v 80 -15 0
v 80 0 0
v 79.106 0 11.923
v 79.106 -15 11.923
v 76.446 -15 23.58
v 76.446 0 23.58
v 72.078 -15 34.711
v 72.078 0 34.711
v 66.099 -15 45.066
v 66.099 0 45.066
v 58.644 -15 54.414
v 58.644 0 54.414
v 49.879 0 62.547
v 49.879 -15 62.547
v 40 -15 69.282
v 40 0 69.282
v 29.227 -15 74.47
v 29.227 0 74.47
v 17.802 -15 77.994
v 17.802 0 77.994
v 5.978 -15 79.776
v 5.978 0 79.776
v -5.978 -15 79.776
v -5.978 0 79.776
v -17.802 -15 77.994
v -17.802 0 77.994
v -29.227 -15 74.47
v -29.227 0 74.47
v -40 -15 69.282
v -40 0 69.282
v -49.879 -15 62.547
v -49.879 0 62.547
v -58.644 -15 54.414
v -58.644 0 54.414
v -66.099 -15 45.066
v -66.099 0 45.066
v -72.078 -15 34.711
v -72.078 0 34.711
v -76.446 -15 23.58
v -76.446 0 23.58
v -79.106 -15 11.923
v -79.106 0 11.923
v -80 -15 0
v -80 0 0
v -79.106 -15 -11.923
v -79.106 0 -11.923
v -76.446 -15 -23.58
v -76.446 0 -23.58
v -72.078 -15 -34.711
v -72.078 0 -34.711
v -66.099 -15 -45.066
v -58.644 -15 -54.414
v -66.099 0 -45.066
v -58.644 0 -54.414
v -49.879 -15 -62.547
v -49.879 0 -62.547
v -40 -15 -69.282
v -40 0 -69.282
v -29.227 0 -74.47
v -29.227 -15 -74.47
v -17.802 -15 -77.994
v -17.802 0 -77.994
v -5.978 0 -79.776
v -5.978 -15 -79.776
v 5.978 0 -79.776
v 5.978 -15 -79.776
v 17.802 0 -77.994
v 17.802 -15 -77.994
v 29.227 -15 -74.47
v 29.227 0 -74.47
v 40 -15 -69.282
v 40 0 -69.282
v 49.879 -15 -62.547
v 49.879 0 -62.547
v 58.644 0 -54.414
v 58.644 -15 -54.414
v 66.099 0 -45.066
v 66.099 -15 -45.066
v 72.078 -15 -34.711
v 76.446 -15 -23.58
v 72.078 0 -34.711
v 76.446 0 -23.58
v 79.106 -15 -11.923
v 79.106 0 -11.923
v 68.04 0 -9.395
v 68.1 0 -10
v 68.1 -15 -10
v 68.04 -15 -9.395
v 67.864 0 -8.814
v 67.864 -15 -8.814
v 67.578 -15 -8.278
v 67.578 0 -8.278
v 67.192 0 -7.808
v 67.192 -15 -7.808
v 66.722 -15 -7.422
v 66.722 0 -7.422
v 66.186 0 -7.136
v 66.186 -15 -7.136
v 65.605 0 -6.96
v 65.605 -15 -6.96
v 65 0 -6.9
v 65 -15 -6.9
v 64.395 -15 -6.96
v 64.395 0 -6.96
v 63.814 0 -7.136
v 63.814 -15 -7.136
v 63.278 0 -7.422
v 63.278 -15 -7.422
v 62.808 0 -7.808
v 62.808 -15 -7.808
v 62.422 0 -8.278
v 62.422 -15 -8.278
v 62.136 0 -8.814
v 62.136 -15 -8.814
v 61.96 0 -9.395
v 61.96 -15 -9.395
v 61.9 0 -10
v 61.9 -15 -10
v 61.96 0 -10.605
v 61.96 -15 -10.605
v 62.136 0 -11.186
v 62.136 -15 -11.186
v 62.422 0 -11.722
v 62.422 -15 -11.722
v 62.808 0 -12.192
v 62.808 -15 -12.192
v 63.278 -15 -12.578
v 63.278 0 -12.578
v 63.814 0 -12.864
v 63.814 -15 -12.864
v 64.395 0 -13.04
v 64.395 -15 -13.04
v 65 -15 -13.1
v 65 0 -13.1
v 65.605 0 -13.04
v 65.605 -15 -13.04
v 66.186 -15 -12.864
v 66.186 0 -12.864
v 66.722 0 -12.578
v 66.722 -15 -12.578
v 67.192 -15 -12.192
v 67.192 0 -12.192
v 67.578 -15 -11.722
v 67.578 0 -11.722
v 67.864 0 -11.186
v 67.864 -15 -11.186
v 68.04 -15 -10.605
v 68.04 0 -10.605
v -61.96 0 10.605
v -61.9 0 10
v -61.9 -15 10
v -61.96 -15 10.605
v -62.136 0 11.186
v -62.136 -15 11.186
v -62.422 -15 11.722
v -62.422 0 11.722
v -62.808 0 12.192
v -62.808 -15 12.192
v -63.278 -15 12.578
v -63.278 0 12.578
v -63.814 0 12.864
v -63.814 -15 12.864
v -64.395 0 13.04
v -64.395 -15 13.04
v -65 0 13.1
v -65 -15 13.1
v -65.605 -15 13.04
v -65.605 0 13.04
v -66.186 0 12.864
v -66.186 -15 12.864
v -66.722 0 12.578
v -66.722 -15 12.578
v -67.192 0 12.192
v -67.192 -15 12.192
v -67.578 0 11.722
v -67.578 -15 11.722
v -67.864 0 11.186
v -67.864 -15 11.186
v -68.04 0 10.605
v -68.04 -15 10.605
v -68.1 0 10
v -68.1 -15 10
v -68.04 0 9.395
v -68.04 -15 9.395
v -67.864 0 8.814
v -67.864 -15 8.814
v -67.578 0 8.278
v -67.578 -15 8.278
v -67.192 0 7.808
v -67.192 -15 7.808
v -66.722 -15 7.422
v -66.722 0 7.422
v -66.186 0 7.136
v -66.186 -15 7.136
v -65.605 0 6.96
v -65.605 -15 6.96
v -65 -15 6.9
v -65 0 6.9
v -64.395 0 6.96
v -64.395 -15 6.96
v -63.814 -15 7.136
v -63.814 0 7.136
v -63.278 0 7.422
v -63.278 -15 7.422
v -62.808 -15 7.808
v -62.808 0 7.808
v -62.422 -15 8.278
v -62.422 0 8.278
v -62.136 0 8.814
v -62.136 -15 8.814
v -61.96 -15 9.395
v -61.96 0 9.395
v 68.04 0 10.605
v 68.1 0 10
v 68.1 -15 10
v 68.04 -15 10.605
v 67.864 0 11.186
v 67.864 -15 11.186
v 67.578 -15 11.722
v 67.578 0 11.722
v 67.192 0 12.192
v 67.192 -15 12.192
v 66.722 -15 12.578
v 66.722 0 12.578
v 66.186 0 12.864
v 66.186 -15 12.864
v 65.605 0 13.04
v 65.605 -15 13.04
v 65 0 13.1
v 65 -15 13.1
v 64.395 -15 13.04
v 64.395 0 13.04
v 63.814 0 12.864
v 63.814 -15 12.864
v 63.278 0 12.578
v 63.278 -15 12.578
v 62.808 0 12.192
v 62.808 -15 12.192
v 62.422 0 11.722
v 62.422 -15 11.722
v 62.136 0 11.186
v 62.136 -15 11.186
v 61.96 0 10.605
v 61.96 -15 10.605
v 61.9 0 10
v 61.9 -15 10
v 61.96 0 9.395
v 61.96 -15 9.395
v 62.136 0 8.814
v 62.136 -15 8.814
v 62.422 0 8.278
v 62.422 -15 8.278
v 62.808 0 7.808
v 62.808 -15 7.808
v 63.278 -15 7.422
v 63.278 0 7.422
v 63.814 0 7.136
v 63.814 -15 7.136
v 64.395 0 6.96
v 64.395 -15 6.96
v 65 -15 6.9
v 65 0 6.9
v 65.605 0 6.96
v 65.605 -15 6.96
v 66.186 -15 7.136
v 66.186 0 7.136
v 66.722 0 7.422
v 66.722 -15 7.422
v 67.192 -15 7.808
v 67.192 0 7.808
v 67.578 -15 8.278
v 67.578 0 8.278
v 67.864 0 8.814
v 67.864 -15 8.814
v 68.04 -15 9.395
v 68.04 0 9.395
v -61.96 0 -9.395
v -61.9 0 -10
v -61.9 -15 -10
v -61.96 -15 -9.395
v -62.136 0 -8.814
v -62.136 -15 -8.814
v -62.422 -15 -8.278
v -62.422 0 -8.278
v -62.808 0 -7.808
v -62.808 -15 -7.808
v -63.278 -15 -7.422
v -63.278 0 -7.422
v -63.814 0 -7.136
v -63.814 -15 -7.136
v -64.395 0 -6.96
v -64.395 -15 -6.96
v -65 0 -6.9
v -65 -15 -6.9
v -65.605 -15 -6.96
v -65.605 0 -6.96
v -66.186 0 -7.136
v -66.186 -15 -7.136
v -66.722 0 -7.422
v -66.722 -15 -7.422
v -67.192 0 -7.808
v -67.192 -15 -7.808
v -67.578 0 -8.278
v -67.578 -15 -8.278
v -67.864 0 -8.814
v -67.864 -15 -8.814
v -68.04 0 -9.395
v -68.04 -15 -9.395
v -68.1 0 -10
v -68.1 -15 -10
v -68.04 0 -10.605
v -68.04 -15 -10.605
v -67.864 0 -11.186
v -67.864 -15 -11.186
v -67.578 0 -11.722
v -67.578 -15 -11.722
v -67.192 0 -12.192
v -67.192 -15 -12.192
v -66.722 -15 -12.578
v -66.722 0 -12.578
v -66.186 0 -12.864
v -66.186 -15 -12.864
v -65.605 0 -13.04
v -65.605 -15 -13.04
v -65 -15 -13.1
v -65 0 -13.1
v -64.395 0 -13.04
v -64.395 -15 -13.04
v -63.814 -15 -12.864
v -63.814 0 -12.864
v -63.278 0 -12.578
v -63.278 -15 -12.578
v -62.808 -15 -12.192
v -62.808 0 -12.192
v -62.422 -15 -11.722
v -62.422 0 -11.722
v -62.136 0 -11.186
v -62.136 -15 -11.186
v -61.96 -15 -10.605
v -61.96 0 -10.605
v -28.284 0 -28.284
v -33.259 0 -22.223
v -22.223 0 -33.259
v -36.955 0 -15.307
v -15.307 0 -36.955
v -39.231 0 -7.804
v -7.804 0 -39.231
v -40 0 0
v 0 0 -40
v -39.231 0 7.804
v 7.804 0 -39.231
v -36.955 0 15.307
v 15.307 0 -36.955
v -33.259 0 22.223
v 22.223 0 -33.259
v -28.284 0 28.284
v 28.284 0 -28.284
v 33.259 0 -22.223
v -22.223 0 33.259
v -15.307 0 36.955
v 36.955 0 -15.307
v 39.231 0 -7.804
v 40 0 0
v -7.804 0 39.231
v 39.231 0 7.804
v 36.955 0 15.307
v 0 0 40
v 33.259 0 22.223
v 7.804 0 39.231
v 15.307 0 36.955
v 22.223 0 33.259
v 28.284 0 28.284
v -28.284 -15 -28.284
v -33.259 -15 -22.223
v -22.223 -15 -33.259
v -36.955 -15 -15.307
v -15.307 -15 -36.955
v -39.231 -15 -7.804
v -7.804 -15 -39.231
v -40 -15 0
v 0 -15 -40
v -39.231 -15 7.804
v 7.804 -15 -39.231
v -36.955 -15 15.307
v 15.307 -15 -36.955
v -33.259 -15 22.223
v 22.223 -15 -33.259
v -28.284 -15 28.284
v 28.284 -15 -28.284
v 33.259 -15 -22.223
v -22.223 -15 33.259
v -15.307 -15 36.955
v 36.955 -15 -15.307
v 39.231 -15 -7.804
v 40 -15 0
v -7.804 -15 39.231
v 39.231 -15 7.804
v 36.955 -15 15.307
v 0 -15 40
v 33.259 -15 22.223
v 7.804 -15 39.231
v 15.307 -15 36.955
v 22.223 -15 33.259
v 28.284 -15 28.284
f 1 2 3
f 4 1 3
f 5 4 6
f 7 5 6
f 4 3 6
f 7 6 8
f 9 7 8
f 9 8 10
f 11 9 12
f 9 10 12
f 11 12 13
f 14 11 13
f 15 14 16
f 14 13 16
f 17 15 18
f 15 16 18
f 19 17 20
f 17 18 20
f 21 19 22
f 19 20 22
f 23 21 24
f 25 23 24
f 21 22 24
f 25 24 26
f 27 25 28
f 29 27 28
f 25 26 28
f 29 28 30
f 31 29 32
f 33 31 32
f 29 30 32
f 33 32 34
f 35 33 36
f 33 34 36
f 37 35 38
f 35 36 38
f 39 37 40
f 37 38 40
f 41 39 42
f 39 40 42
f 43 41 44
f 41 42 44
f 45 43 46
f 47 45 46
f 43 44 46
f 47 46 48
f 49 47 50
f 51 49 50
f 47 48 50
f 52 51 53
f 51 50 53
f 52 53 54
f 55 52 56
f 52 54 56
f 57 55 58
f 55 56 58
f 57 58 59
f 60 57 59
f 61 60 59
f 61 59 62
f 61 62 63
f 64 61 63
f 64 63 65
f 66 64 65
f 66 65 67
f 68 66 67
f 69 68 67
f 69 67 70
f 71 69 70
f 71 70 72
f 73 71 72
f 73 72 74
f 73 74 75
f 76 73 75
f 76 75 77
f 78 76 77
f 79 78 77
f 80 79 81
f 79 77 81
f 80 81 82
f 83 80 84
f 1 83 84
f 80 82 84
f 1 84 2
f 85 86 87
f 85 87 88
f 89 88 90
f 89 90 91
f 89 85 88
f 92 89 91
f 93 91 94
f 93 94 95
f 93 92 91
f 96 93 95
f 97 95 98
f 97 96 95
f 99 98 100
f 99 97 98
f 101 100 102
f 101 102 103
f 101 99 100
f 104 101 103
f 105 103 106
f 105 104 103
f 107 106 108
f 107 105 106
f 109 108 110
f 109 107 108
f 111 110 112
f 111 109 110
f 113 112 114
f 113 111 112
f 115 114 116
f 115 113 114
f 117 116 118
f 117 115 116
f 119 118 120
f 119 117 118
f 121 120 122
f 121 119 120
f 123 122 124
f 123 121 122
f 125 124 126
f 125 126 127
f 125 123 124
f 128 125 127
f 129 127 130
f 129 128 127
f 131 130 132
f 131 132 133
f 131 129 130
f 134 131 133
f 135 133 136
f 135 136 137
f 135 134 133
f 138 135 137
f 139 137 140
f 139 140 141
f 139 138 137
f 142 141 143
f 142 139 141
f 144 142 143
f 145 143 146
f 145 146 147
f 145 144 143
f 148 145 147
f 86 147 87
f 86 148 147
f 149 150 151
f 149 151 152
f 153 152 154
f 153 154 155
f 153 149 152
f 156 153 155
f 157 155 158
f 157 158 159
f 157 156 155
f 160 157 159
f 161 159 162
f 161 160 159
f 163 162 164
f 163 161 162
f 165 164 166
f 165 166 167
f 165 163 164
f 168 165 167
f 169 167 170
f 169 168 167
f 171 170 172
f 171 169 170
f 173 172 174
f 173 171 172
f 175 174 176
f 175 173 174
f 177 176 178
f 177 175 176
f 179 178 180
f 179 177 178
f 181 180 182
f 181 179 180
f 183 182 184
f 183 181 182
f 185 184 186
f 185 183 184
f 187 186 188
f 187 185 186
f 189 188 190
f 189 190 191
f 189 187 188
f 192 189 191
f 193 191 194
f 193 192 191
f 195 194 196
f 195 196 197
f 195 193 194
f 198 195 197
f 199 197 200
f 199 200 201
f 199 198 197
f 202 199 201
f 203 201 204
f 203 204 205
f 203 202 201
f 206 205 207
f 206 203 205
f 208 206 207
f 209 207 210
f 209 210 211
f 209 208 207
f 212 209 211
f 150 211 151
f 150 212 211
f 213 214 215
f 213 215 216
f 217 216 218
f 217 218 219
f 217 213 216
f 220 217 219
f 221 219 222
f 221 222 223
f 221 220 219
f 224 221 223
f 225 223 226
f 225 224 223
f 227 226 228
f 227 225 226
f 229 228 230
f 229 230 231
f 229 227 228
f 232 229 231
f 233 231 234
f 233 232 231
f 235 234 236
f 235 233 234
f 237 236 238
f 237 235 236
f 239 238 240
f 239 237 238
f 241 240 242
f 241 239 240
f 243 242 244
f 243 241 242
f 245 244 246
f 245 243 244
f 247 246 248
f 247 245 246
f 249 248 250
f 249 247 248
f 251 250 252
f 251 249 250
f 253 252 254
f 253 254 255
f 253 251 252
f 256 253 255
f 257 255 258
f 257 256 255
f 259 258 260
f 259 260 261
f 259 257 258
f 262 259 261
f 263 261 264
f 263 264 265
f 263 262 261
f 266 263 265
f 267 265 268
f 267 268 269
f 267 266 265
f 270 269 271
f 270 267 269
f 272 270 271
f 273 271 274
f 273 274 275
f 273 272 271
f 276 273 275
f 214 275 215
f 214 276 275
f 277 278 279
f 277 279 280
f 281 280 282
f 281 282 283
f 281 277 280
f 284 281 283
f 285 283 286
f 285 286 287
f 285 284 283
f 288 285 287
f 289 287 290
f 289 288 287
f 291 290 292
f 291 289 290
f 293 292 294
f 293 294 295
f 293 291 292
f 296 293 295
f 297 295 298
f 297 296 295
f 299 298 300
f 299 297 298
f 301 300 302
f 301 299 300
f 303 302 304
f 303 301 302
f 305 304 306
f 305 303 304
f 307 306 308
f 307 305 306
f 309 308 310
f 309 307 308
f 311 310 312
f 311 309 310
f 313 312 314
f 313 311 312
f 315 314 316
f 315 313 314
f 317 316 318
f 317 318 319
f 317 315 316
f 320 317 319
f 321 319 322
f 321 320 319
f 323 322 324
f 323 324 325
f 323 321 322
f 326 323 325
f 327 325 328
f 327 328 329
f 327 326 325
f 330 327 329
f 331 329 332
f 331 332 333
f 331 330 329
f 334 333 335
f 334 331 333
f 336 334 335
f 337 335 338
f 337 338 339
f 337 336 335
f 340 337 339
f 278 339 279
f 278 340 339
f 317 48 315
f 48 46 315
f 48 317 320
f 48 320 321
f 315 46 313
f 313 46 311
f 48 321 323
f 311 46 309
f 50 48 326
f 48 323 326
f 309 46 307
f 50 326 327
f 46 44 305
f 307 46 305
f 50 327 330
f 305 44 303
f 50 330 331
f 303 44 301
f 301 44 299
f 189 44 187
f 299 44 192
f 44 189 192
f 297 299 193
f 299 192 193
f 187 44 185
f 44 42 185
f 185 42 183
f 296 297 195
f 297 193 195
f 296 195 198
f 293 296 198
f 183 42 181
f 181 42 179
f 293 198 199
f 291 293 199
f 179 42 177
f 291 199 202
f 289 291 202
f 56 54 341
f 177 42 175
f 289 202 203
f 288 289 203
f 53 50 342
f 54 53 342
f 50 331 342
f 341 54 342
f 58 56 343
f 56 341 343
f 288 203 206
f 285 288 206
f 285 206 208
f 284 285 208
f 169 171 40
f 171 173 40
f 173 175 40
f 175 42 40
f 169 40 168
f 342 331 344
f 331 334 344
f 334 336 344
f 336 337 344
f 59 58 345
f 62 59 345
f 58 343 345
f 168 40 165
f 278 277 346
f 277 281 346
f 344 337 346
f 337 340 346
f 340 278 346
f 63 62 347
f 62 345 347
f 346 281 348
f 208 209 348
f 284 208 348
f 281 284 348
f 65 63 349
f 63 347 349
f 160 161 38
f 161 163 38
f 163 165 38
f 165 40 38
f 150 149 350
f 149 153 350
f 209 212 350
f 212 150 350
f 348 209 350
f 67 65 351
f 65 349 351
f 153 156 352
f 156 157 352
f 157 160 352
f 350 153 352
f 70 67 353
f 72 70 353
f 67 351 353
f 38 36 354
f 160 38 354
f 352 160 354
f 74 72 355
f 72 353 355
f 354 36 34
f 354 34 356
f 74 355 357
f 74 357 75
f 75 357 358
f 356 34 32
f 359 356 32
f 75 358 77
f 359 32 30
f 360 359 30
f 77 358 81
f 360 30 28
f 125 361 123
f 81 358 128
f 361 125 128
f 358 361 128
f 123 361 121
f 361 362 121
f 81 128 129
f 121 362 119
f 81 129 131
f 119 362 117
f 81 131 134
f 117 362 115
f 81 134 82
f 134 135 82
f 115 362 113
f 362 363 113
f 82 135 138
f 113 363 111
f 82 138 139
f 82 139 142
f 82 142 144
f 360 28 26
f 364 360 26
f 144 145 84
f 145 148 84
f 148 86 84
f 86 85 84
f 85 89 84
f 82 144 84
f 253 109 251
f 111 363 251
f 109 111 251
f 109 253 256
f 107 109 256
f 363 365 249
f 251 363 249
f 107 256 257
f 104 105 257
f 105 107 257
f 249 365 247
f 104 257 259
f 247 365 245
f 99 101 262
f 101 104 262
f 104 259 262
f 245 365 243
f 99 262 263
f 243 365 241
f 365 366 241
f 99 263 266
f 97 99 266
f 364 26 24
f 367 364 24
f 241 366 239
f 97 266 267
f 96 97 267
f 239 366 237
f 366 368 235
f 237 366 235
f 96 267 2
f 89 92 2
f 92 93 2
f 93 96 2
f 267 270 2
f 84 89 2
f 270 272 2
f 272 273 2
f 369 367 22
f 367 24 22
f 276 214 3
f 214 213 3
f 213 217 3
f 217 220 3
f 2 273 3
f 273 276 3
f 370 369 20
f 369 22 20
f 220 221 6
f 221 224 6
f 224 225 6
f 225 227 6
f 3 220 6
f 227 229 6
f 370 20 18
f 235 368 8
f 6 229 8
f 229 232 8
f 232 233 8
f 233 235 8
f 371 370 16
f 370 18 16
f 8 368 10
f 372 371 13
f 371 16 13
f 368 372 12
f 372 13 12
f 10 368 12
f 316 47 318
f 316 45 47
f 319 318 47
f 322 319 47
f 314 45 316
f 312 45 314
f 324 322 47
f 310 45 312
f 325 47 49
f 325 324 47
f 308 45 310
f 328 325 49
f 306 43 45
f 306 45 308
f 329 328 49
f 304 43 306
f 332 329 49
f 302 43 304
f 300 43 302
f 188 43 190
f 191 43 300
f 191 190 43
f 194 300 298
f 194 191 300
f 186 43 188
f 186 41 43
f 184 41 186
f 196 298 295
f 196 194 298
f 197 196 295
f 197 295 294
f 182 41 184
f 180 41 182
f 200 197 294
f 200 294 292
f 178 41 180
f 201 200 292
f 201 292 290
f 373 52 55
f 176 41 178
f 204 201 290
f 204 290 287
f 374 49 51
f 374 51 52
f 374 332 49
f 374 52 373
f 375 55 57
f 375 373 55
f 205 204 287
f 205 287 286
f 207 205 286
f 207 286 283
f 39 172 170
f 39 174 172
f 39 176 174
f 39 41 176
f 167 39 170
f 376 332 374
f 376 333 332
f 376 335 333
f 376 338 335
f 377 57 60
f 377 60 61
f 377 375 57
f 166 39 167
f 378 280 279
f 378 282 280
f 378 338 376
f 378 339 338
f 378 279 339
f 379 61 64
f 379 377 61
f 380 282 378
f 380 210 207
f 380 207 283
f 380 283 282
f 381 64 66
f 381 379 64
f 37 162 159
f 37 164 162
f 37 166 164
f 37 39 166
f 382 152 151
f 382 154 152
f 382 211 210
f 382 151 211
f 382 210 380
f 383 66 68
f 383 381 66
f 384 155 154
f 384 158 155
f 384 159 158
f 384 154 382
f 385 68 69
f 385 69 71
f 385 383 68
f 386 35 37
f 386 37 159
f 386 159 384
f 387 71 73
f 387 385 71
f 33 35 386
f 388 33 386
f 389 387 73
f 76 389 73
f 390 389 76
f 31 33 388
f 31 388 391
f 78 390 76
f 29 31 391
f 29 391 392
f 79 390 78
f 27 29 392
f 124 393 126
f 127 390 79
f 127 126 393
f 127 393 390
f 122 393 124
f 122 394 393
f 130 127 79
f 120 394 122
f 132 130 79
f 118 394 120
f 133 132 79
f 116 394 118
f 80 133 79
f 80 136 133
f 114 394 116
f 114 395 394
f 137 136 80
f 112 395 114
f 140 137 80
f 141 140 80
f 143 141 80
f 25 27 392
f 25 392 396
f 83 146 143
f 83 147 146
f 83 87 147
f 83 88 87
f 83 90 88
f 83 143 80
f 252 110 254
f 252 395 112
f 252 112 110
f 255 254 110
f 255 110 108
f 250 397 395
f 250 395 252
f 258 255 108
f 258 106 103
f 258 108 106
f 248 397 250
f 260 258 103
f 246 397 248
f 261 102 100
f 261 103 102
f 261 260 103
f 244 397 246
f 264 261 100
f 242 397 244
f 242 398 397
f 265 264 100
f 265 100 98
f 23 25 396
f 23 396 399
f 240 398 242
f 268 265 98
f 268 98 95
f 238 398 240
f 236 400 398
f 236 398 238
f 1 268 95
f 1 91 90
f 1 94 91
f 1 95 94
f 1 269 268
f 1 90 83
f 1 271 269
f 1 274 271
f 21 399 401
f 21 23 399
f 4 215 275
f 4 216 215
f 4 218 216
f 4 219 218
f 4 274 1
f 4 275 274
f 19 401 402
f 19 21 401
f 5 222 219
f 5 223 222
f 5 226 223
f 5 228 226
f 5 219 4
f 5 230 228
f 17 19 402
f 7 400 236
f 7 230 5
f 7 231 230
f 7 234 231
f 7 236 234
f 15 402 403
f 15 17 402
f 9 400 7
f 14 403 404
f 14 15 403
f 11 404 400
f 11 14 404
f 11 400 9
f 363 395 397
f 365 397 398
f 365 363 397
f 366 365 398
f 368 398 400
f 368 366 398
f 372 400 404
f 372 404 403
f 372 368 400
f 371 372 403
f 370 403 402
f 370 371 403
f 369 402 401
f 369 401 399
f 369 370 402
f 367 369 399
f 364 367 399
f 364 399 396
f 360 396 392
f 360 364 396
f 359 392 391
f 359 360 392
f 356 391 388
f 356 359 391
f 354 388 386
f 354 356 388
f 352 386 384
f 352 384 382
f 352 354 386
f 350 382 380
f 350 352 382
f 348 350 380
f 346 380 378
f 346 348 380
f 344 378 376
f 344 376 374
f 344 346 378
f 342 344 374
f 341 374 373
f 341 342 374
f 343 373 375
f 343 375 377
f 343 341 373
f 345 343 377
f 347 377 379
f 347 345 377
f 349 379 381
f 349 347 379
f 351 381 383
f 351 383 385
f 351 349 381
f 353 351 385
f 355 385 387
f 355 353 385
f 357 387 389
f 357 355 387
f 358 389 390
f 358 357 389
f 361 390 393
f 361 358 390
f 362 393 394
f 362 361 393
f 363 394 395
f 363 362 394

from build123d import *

# Parameters (mm, degrees)
F0_R     = 80
F0_R_2   = 3.1
F0_R_3   = 40
F1_DEPTH = 15


with BuildPart() as f1:
    # F0 (on Front) → F1 (new body)
    with BuildSketch(Plane.XZ):
        Circle(F0_R)
        with Locations((-65, -10)):
            Circle(F0_R_2, mode=Mode.SUBTRACT)
        with Locations((65, -10)):
            Circle(F0_R_2, mode=Mode.SUBTRACT)
        with Locations((-65, 10)):
            Circle(F0_R_2, mode=Mode.SUBTRACT)
        Circle(F0_R_3, mode=Mode.SUBTRACT)
        with Locations((65, 10)):
            Circle(F0_R_2, mode=Mode.SUBTRACT)
    extrude(amount=F1_DEPTH)


solid = f1.part
